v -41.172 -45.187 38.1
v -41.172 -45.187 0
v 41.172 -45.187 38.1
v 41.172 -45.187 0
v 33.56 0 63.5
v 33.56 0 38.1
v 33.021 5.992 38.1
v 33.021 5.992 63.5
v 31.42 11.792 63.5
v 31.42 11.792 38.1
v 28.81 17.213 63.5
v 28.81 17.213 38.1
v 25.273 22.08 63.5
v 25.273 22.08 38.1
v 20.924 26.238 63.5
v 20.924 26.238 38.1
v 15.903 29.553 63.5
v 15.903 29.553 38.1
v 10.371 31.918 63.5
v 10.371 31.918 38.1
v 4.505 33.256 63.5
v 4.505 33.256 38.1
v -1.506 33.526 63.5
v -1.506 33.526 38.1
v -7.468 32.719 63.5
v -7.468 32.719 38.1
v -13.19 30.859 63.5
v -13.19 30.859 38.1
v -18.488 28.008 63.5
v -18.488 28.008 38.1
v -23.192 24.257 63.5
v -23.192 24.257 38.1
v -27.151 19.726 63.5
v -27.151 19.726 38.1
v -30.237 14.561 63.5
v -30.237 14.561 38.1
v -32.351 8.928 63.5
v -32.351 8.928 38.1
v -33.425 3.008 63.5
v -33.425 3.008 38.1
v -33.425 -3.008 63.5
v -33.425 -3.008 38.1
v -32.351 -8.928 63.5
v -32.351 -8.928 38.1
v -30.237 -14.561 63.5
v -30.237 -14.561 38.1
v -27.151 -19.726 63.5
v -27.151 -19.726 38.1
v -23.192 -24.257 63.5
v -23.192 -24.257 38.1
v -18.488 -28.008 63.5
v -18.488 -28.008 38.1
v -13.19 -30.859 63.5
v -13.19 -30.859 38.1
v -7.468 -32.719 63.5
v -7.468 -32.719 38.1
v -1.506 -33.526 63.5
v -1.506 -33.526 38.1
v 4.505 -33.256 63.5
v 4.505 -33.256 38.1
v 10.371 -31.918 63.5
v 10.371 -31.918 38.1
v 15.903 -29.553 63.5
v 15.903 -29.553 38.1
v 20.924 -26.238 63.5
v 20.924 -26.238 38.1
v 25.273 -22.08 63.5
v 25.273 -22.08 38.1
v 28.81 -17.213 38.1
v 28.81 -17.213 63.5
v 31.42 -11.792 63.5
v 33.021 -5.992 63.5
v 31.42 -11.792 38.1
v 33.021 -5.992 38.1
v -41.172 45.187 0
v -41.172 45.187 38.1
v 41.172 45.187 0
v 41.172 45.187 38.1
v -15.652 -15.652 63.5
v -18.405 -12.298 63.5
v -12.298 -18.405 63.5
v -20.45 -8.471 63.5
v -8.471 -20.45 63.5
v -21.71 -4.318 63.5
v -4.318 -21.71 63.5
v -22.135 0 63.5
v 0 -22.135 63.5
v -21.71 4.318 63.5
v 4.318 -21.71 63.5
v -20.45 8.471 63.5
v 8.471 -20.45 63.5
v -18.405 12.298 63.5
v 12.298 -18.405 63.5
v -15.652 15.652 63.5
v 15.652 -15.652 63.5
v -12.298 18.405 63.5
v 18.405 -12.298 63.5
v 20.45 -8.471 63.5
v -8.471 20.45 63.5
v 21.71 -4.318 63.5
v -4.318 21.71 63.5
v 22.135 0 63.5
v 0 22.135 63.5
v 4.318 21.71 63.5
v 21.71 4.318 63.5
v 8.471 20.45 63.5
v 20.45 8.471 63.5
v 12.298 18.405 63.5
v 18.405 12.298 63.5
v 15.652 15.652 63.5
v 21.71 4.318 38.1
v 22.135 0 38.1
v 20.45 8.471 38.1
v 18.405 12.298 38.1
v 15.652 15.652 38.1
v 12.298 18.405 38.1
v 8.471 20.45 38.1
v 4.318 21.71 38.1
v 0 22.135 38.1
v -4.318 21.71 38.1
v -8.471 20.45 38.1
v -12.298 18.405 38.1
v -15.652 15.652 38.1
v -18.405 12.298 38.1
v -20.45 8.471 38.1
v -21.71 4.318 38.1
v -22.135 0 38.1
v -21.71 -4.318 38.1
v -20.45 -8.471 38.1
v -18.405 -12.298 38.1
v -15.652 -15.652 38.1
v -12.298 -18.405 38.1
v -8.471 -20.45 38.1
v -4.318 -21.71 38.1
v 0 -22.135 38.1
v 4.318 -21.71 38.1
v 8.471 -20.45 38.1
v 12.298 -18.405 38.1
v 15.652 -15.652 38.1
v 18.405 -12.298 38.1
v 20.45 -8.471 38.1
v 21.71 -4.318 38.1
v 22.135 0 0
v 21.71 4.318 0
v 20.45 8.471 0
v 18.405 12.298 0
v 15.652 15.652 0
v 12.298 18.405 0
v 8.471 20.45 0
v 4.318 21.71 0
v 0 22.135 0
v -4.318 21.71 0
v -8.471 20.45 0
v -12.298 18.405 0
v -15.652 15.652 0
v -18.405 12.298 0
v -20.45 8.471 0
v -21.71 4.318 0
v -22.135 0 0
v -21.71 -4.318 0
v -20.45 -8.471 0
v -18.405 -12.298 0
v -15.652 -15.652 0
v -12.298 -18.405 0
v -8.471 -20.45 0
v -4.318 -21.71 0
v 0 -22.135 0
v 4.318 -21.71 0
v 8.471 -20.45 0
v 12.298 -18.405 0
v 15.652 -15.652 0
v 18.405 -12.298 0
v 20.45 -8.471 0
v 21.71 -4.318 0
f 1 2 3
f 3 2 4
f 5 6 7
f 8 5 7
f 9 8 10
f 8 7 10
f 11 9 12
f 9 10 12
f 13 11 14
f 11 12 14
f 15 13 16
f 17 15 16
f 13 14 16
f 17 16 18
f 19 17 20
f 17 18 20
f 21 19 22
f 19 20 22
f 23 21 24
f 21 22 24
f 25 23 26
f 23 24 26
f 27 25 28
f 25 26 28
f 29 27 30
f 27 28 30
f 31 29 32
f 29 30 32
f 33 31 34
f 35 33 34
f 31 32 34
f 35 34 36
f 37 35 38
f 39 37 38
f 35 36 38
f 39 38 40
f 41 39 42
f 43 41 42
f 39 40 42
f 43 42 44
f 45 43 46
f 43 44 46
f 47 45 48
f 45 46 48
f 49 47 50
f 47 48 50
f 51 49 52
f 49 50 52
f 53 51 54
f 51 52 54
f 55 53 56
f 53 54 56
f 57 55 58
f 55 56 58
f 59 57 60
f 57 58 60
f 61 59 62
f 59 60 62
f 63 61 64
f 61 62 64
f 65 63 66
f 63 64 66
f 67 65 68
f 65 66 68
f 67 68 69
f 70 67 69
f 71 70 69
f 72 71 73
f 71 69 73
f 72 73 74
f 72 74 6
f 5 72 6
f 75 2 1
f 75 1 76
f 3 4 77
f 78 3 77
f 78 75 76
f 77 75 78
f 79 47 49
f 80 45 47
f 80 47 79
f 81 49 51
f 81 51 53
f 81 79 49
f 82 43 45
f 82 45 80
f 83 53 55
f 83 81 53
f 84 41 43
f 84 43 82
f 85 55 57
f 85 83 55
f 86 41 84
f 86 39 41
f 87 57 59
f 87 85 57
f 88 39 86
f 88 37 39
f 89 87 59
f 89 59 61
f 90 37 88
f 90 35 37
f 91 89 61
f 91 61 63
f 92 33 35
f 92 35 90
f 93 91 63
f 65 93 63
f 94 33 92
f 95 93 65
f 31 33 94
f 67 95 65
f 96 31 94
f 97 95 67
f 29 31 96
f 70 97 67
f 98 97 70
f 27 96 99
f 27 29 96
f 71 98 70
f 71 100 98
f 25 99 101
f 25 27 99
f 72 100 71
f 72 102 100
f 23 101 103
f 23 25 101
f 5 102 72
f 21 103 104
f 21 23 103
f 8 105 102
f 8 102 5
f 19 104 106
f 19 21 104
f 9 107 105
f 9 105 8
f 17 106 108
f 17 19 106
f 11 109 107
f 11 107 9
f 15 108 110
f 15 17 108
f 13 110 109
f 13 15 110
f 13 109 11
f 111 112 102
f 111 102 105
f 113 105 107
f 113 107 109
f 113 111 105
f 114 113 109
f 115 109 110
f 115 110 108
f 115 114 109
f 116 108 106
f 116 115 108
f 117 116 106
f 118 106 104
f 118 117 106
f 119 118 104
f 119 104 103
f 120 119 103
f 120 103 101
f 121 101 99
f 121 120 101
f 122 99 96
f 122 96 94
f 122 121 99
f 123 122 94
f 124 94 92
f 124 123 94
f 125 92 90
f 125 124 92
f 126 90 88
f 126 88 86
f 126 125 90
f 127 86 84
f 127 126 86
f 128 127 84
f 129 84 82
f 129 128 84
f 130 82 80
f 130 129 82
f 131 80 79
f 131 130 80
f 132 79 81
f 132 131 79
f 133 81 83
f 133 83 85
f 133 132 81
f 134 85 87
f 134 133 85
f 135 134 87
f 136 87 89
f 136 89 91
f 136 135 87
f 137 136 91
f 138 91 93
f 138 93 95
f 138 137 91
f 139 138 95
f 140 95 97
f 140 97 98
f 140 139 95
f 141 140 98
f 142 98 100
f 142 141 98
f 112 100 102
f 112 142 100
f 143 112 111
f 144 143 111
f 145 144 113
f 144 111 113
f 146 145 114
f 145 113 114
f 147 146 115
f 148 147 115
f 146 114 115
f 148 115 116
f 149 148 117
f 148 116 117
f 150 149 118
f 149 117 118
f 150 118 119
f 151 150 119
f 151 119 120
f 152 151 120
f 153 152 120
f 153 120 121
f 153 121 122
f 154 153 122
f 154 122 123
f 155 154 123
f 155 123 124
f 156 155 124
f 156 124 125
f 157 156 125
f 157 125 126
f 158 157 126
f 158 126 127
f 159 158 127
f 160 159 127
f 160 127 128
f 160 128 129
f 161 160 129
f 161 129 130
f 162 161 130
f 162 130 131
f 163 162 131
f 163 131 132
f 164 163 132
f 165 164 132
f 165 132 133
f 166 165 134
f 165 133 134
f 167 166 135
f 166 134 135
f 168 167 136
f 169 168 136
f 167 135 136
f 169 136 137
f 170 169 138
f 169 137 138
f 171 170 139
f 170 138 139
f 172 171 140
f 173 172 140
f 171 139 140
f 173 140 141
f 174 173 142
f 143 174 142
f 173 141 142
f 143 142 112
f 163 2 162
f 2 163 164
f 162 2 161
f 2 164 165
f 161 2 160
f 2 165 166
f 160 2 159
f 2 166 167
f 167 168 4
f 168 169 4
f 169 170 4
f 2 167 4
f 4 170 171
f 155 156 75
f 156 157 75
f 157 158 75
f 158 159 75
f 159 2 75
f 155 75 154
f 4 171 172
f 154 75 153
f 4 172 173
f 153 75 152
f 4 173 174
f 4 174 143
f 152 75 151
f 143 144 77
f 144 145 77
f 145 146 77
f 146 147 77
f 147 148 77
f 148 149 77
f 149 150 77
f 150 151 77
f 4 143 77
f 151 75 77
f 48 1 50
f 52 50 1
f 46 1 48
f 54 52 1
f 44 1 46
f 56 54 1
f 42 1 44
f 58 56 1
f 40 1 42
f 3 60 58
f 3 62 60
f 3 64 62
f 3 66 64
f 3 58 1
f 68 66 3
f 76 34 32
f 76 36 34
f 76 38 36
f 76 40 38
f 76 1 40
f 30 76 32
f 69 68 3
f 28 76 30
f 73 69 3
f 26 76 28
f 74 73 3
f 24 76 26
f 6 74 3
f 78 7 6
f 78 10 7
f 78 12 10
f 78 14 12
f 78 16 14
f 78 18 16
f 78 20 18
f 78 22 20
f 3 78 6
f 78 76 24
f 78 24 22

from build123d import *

# Parameters (mm, degrees)
F0_W      = 82.344018
F0_H      = 90.373024
F1_DEPTH  = 38.1
F2_R      = 33.560103
F2_R_2    = 22.134941
F3_DEPTH  = 25.4
F3_FACE_R = 22.134941
F4_DEPTH  = 127


with BuildPart() as f1:
    # F0 (on Top) → F1 (new body)
    with BuildSketch(Plane.XY):
        Rectangle(F0_W, F0_H)
    extrude(amount=F1_DEPTH)

    # F2 (on face) → F3 (join)
    with BuildSketch(Plane.XY.offset(38.1)):
        Circle(F2_R)
        Circle(F2_R_2, mode=Mode.SUBTRACT)
    extrude(amount=F3_DEPTH)

    # F3_face (on face) → F4 (cut)
    with BuildSketch(Plane.XY.offset(38.1)):
        Circle(F3_FACE_R)
    extrude(amount=-F4_DEPTH, mode=Mode.SUBTRACT)


solid = f1.part
